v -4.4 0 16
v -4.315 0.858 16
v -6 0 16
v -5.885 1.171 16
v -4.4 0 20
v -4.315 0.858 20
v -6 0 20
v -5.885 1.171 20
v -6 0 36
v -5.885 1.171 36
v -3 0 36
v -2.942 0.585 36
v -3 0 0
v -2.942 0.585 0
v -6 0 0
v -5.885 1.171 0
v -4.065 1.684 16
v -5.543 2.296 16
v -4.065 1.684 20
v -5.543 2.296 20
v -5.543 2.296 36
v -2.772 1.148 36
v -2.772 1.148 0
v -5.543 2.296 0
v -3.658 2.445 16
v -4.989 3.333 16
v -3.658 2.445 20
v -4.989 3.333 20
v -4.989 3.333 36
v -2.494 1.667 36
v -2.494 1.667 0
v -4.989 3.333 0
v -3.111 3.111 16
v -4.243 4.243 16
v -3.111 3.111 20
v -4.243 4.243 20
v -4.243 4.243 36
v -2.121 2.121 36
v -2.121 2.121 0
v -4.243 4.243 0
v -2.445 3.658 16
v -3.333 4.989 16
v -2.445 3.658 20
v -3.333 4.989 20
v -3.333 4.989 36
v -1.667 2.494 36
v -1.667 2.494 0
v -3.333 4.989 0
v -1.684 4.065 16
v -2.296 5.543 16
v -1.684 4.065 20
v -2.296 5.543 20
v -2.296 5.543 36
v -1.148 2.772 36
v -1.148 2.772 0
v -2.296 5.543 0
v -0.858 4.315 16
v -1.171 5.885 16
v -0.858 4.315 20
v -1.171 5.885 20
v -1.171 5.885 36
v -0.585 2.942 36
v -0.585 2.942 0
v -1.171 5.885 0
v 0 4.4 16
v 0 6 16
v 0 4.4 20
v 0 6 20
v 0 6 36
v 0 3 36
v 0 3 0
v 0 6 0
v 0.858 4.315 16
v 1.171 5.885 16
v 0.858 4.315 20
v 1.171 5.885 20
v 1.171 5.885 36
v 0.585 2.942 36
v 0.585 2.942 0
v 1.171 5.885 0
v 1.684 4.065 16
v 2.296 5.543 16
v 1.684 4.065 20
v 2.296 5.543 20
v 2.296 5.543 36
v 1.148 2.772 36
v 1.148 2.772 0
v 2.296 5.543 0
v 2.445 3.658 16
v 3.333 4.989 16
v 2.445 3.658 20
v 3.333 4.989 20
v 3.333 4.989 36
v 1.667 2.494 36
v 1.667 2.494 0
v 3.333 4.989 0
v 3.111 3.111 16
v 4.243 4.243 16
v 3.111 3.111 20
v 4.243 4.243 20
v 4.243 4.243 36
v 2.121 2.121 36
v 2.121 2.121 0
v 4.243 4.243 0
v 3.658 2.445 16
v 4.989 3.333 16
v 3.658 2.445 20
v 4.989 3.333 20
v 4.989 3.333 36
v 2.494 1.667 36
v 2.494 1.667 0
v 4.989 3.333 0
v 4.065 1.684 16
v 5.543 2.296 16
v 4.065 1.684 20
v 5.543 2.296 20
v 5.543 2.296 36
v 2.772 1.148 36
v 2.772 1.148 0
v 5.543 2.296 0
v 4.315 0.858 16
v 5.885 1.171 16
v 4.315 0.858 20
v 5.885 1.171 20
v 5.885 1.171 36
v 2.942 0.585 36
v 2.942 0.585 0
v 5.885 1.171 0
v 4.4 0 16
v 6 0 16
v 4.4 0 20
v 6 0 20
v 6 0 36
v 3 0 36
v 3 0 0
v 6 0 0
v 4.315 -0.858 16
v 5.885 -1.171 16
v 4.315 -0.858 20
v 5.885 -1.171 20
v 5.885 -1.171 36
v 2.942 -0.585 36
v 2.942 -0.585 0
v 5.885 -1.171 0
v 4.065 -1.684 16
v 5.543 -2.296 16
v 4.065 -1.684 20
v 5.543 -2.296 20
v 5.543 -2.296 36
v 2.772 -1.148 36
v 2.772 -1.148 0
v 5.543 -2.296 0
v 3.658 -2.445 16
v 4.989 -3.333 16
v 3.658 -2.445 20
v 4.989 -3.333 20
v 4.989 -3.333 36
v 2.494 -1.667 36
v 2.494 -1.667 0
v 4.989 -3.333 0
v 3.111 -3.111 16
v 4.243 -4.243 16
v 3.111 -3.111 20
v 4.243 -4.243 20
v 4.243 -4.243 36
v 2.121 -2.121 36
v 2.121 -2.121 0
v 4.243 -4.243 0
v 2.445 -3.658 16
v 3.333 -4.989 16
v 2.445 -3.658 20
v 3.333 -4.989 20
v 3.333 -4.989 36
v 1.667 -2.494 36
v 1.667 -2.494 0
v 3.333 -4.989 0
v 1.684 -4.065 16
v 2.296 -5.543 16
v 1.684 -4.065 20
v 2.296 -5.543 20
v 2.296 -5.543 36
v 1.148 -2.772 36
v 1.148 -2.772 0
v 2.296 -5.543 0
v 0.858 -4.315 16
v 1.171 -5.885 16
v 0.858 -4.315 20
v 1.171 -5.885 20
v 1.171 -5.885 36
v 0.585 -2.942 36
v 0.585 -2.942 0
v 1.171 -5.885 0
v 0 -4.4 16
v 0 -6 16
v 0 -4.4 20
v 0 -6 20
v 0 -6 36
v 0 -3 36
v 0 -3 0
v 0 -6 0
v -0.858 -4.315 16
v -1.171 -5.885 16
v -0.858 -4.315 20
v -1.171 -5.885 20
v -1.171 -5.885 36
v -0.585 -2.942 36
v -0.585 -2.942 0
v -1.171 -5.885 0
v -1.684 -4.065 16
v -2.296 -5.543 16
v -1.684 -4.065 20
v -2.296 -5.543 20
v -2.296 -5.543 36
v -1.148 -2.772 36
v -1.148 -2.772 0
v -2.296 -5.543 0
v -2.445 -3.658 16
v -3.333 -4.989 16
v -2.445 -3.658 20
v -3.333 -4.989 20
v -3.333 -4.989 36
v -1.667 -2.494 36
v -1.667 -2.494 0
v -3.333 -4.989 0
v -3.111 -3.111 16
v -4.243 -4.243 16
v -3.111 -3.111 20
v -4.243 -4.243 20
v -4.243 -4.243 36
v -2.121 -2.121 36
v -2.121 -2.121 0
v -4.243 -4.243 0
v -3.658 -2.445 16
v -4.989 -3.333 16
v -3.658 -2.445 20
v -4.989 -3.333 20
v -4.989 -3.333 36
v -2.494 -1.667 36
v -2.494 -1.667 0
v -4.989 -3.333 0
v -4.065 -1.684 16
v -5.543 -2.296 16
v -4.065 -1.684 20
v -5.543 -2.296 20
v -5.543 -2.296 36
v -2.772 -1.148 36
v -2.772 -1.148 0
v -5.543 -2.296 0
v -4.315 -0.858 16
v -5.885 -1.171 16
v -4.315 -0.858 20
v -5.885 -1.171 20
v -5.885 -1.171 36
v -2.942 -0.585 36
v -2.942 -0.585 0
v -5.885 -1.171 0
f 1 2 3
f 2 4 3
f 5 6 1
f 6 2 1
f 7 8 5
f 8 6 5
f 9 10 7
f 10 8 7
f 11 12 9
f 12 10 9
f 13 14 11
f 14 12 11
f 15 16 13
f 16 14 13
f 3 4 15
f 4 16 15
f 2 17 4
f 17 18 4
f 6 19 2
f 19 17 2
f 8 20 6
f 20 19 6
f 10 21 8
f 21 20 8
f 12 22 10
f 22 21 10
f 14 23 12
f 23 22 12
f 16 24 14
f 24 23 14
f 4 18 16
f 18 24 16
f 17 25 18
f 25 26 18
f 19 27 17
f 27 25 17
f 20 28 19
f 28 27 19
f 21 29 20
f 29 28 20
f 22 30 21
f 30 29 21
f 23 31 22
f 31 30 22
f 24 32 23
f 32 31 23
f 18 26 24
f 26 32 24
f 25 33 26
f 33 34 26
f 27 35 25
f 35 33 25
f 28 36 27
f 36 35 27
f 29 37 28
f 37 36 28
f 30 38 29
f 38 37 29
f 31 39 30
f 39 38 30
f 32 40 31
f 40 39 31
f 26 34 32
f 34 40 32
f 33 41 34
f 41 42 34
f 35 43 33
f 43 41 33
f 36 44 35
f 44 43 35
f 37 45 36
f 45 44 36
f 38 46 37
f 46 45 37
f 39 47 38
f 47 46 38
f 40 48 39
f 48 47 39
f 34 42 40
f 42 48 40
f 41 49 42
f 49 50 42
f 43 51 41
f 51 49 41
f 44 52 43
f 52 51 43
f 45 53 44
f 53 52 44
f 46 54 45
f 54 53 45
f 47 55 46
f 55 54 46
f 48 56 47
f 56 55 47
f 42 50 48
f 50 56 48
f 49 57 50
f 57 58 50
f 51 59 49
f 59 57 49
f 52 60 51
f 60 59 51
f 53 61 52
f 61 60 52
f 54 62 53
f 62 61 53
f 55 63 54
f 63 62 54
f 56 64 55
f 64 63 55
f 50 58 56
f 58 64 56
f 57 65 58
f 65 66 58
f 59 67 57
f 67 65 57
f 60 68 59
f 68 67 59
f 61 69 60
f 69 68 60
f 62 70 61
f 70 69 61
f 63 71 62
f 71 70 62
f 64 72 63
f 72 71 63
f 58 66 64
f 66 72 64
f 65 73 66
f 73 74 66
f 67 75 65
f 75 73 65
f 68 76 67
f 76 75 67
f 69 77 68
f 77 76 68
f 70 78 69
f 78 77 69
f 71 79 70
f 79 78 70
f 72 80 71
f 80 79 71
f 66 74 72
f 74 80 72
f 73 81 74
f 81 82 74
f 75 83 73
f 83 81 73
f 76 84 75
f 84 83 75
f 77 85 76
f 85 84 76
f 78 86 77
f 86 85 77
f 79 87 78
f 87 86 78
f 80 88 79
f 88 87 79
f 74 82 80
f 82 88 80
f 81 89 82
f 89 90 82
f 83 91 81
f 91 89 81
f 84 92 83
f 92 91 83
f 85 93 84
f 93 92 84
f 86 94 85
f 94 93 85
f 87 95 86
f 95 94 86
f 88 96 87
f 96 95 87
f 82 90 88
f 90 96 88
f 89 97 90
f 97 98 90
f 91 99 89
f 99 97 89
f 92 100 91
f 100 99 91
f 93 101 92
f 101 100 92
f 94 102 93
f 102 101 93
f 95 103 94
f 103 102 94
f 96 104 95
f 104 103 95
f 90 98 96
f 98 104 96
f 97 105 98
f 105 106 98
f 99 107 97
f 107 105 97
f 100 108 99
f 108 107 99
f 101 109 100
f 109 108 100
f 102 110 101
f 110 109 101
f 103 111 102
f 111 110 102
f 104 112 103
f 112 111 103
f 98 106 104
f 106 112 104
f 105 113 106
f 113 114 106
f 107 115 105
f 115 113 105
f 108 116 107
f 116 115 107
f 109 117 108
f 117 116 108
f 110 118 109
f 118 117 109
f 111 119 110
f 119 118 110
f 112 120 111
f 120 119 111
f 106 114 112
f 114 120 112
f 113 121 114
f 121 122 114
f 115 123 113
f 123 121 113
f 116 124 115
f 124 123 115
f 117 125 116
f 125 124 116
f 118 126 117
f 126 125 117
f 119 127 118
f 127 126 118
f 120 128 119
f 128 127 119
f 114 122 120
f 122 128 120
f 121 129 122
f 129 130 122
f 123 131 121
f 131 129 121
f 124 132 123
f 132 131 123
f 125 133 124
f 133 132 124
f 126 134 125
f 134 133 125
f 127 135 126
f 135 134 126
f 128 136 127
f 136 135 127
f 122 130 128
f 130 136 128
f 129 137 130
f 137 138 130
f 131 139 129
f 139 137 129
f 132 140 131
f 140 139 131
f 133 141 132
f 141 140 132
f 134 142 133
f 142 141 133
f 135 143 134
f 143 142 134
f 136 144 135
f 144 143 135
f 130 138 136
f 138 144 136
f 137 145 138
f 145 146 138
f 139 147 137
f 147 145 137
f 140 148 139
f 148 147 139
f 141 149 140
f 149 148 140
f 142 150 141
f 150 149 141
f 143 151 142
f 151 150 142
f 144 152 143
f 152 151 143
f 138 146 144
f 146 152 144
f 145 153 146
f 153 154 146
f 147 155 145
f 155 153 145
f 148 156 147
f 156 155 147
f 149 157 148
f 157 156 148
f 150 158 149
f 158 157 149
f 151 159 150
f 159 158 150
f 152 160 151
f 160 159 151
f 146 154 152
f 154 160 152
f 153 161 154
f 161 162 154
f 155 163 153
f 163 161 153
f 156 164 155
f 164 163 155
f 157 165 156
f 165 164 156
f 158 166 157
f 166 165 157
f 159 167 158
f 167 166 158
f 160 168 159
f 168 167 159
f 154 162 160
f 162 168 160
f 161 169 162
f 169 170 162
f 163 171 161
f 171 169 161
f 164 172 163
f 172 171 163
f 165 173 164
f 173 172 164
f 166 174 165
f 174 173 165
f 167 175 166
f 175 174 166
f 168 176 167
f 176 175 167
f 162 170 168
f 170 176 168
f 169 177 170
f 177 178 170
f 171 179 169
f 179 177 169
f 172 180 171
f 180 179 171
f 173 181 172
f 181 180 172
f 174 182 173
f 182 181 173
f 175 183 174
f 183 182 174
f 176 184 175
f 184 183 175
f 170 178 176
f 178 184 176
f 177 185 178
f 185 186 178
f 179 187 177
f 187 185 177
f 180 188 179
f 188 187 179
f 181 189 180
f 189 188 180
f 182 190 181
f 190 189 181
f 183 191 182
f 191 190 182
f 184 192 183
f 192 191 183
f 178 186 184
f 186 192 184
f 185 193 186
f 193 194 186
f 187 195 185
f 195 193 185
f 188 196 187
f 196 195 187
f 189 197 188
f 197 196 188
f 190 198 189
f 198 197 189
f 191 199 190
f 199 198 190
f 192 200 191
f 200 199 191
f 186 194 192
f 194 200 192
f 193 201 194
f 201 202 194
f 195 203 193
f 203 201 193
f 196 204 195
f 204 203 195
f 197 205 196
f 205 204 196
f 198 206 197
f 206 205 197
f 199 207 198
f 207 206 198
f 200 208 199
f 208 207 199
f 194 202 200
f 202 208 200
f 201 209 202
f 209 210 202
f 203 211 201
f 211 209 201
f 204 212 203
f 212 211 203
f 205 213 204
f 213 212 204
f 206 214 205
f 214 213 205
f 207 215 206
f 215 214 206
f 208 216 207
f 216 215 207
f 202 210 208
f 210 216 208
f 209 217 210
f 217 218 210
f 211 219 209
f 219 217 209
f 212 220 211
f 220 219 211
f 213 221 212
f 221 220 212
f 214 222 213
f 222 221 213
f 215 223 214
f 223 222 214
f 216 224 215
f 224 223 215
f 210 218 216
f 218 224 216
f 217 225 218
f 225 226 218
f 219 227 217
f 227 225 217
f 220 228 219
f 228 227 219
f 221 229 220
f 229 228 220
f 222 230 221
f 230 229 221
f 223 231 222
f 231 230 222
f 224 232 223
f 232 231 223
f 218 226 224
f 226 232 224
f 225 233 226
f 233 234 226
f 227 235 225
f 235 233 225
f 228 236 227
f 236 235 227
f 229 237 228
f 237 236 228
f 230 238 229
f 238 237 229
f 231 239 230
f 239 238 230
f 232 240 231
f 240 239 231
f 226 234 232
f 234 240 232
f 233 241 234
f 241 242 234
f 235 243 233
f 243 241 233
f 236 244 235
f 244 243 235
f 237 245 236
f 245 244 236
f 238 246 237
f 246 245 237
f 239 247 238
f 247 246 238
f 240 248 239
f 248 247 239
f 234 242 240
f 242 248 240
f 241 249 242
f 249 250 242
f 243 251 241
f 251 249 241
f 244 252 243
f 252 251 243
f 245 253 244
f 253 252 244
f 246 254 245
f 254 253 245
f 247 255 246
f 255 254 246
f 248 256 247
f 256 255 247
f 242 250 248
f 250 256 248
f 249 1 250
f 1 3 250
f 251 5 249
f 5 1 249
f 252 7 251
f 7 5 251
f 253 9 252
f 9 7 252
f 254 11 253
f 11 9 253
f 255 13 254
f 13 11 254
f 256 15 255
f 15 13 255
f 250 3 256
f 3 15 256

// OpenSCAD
$fn = 32;

// ----------------------------------------------------------------------
// Grooved revolve: stepped, bore R3
// ----------------------------------------------------------------------

// --- parameters (mm) ---
bore_r = 3;               // bore radius
outer_r = 6;              // outer radius of the body
total_h = 36;             // overall height, Z
wall = 3;                 // radial wall thickness
groove_w = 4;             // groove width
groove_d = 1.6;           // groove depth
grooves = 1;              // number of outer grooves

bbox_x = 2 * outer_r;  // full diameter
bore_d = 2 * bore_r;  // bore diameter
body_d = 2 * outer_r;  // body diameter
revolve_angle = 360;  // full turn around the Z axis

profile = [[3, 0], [6, 0], [6, 16], [4.4, 16], [4.4, 20], [6, 20], [6, 36], [3, 36]];  // primary outline, 8 points, counter clockwise

// --- the one profile operation ---
rotate_extrude(angle = revolve_angle) polygon(points = profile);
